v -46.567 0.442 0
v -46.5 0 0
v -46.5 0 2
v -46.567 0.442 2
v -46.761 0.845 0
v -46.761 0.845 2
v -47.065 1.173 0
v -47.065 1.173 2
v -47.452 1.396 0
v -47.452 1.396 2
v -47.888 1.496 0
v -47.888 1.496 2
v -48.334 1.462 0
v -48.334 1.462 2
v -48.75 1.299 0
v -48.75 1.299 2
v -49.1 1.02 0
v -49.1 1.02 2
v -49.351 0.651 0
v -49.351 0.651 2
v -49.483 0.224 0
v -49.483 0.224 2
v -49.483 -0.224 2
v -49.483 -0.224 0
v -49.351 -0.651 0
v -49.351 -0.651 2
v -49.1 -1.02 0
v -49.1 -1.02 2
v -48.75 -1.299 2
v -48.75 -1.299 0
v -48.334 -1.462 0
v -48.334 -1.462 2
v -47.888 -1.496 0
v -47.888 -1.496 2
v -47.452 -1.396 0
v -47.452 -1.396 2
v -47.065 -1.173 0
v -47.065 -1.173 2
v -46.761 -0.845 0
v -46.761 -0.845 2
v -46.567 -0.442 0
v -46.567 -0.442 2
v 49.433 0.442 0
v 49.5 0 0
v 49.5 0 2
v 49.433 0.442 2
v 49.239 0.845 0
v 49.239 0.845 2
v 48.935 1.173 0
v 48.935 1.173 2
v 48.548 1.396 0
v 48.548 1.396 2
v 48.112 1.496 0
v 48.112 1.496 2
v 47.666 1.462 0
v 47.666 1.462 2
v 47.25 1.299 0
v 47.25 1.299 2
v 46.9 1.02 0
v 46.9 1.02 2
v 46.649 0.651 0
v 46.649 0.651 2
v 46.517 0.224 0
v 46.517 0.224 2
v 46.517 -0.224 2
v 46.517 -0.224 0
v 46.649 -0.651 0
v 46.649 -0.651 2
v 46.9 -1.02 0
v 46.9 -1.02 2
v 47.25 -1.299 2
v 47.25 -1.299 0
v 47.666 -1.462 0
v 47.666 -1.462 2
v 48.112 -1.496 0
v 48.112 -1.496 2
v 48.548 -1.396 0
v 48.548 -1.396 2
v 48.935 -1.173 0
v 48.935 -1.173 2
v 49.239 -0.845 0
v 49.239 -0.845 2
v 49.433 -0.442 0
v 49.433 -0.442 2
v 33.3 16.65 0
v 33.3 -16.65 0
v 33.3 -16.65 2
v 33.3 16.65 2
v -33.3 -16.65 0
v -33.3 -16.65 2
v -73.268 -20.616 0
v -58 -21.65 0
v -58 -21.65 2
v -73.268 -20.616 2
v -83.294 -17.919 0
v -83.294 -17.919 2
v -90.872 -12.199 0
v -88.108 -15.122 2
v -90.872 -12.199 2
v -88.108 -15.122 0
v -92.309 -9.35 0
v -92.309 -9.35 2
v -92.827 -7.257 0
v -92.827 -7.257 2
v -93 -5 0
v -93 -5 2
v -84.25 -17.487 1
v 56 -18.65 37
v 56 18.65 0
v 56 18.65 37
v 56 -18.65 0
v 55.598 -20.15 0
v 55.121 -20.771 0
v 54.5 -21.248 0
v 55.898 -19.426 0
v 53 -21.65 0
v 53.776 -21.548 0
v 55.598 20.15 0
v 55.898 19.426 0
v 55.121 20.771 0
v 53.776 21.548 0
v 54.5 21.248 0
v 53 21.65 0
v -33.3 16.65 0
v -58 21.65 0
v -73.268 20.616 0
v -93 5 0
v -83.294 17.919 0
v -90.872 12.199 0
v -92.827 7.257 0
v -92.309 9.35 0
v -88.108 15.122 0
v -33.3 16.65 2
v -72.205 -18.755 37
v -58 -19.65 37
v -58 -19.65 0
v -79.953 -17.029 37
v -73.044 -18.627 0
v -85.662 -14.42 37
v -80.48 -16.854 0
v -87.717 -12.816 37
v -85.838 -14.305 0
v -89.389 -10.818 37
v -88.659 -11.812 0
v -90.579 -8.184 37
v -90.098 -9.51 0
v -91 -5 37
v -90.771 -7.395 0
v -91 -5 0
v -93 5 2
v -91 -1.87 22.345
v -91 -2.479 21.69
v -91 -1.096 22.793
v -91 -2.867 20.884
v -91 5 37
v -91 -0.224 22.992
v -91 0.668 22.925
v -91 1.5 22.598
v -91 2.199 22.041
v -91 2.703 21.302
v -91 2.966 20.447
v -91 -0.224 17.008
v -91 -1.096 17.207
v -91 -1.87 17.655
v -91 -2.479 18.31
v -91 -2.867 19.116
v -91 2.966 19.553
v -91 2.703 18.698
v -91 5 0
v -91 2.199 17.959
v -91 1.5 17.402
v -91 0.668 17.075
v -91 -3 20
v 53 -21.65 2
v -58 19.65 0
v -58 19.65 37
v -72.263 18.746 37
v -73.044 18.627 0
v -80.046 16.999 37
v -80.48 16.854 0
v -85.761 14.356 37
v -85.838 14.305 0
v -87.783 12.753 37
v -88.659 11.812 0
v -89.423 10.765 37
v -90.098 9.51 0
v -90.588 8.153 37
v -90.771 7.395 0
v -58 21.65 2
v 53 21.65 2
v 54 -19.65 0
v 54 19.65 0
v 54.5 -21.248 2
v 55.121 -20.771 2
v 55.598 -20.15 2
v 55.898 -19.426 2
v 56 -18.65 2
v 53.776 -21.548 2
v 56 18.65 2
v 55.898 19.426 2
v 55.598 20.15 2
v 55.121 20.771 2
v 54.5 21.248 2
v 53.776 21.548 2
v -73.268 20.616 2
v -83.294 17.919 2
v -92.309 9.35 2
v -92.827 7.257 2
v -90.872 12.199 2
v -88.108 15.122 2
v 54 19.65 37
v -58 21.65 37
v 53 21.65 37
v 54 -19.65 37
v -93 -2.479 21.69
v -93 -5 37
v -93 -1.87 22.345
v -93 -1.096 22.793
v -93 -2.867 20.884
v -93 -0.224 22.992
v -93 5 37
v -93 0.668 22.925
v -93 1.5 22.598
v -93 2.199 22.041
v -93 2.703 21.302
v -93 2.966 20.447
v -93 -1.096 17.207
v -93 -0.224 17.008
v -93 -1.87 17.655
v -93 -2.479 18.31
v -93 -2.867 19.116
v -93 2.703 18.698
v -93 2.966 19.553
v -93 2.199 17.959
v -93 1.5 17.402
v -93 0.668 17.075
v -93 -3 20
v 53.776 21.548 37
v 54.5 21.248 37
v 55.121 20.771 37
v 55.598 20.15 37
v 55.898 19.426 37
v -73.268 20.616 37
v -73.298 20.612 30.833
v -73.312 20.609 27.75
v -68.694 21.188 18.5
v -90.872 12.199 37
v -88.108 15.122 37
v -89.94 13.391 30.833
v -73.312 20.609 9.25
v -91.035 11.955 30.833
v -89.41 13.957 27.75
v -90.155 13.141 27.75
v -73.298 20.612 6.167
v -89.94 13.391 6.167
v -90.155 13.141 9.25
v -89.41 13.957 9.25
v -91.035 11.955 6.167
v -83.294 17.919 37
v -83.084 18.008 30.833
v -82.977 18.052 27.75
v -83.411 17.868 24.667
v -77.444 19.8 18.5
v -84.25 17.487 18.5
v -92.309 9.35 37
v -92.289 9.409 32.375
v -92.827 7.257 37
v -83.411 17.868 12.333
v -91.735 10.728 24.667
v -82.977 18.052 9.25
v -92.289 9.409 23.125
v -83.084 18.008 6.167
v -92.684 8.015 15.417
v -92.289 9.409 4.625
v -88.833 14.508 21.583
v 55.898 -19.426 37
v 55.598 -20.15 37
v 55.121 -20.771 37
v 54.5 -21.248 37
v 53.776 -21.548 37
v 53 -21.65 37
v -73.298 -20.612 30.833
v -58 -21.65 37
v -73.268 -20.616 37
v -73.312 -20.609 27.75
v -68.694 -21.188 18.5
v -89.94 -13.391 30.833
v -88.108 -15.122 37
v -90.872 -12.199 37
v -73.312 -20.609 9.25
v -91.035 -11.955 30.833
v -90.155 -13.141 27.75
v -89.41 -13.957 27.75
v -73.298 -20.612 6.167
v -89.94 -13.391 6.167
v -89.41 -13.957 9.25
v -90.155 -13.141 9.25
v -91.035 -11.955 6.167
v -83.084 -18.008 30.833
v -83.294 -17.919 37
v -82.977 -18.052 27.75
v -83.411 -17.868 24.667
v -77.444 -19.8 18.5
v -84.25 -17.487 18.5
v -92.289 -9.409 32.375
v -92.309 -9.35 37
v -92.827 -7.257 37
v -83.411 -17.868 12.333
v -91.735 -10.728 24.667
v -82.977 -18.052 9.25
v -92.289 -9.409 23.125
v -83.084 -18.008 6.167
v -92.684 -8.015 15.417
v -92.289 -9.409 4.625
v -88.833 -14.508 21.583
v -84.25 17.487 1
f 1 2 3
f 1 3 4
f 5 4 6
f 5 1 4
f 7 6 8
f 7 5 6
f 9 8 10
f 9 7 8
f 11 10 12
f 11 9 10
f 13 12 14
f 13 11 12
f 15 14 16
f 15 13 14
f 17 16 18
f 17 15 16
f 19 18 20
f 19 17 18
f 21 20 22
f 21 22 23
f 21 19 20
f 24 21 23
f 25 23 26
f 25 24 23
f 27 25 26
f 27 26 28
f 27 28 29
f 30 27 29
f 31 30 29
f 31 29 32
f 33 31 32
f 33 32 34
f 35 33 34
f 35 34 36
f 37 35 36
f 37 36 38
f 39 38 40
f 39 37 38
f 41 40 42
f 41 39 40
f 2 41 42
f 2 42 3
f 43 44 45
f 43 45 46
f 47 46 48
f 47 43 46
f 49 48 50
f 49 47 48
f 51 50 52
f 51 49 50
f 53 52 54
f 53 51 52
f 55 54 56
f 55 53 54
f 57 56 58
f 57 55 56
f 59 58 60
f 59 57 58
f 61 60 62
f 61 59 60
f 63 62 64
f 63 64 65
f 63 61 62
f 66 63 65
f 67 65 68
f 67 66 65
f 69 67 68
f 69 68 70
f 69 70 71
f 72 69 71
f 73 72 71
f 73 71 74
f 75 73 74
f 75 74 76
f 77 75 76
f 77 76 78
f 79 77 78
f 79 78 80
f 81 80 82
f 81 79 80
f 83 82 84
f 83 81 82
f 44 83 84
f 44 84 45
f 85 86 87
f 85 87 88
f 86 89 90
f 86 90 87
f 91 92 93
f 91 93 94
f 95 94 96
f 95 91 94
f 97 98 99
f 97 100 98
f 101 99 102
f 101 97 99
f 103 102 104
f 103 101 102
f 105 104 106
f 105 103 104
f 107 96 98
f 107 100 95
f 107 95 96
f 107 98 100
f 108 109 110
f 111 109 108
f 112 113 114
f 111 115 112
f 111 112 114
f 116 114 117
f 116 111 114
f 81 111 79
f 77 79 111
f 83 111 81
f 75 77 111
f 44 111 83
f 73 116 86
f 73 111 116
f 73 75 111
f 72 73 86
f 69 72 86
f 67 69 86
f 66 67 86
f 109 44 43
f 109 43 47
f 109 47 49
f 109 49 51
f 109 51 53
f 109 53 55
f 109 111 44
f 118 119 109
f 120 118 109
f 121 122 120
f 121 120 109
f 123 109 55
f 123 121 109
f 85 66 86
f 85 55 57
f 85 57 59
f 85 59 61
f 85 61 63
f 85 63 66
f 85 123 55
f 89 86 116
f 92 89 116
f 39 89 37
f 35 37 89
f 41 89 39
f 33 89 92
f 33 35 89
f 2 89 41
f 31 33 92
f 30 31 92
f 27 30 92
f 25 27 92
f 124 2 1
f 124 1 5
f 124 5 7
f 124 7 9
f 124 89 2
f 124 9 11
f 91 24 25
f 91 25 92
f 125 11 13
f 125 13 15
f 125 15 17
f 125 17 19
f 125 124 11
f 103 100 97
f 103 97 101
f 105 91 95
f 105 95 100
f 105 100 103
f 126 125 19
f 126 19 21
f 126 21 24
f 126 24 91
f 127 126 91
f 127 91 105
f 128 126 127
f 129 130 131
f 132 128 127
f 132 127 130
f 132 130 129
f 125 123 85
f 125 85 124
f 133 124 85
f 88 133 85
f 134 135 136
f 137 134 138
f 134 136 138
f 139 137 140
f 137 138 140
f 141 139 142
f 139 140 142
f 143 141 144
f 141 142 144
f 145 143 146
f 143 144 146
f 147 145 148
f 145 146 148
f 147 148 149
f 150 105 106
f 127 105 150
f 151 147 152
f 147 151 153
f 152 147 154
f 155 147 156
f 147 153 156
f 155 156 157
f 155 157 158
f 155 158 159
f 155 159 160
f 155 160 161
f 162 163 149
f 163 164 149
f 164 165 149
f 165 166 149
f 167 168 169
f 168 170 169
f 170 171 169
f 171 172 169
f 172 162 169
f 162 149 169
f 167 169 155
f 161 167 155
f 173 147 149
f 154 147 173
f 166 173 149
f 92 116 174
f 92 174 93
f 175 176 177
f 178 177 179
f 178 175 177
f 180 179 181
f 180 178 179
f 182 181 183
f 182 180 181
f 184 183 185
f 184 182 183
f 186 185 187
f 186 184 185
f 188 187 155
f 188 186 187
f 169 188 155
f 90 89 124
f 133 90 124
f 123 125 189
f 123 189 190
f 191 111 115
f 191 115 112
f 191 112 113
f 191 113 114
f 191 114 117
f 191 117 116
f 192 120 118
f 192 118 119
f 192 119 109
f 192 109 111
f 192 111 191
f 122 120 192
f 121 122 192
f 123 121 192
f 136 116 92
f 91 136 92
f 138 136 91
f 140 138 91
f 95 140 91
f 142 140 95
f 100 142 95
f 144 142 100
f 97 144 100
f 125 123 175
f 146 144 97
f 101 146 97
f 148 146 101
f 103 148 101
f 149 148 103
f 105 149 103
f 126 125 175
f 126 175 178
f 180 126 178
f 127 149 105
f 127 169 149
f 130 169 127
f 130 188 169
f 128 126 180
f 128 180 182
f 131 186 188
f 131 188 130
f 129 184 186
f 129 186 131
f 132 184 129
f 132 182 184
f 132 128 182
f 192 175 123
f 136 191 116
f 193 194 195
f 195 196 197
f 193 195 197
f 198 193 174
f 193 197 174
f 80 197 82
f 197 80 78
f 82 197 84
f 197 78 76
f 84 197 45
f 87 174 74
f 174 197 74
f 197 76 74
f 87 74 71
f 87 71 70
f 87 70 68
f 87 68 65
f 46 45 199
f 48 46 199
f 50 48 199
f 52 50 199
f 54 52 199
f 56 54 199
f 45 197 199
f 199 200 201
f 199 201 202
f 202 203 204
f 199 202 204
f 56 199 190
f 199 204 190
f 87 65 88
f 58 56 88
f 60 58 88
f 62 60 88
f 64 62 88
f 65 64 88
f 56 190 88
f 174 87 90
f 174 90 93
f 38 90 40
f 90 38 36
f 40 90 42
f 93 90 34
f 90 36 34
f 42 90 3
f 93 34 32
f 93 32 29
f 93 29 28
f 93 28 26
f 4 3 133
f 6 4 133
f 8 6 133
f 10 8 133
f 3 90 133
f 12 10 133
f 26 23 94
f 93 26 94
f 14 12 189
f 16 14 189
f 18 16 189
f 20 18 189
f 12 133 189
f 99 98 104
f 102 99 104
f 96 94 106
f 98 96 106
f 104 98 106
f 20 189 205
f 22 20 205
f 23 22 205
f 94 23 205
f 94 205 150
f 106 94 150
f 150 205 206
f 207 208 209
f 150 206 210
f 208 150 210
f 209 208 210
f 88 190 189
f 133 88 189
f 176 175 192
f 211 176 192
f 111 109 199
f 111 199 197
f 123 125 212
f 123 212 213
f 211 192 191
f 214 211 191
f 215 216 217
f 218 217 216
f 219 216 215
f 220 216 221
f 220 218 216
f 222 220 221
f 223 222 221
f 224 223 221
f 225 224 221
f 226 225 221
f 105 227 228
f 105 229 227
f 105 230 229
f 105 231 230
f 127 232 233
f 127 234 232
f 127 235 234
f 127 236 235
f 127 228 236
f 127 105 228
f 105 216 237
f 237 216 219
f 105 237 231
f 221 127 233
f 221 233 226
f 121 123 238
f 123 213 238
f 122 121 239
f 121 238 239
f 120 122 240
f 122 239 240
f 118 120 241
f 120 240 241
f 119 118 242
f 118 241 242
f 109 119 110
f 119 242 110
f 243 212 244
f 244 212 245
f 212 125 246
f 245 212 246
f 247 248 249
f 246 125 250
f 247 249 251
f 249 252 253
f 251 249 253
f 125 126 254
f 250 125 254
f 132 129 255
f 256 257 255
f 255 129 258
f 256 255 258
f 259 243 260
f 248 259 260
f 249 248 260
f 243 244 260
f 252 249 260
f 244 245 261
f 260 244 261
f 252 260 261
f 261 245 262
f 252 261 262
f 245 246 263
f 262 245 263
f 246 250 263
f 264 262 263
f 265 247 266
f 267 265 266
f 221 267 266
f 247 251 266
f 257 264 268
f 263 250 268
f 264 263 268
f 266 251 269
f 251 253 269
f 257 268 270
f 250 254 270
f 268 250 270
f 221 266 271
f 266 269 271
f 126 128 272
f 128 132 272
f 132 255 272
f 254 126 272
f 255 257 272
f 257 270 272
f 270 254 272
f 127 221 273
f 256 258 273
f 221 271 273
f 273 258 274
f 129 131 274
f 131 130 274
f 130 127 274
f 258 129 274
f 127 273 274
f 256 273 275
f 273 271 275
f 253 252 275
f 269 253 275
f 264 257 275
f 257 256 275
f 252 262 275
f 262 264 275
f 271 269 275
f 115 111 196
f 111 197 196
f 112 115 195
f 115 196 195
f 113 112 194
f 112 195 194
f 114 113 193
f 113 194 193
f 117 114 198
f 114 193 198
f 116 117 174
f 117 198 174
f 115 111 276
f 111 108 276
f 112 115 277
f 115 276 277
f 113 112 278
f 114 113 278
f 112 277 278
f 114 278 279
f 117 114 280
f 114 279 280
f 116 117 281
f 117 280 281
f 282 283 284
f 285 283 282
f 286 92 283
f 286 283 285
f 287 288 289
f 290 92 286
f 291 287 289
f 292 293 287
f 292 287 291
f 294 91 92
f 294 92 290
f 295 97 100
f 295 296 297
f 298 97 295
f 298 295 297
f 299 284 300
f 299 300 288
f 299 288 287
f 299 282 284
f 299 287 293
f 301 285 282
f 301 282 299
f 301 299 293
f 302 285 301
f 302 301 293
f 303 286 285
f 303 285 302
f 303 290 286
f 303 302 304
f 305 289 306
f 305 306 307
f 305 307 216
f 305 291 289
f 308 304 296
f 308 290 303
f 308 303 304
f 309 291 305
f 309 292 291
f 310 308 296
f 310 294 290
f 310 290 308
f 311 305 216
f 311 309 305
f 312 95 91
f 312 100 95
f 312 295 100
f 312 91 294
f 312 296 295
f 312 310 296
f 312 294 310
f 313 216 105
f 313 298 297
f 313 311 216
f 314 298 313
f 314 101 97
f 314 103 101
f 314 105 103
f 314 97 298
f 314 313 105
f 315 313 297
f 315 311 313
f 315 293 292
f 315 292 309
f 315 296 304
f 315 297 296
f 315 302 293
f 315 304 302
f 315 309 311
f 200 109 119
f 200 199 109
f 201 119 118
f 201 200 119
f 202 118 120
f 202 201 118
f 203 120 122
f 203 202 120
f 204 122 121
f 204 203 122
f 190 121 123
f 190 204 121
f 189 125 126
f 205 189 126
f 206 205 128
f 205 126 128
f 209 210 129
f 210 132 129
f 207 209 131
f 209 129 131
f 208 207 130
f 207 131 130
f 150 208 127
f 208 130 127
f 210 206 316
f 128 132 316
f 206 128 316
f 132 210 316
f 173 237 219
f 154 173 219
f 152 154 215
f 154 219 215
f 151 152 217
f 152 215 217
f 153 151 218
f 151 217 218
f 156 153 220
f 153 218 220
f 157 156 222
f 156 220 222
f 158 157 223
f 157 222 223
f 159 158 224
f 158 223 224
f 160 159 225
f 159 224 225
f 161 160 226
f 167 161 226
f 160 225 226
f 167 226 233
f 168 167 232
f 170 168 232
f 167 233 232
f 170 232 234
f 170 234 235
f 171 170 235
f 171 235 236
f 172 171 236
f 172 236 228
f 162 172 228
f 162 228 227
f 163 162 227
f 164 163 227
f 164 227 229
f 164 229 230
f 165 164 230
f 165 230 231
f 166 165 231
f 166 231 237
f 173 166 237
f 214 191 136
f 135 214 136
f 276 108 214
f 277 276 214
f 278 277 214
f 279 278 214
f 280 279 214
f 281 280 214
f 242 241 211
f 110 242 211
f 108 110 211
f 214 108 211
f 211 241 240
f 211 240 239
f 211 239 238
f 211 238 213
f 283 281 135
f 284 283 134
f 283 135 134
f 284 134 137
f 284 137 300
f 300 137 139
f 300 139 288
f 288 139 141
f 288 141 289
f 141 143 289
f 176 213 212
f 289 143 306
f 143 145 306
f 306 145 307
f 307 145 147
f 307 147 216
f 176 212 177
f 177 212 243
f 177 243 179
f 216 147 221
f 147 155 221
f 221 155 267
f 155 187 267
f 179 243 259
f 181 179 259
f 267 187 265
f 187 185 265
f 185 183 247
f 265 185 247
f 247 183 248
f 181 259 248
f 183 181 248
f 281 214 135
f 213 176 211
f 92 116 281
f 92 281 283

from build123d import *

# Parameters (mm, degrees)
PAD_DEPTH    = 37
THICKNESS_T  = -2
SKETCH002_R  = 3
HOLE_DEPTH   = 25
HOLE_TIPS_R  = 3
FILLET_R     = 3
SKETCH_W     = 66.6
SKETCH_H     = 33.3
SKETCH_R     = 1.5
PAD001_DEPTH = 2
FILLET001_R  = 3
FILLET002_R  = 3


with BuildPart() as body:
    # Sketch001 → Pad (new body)
    with BuildSketch(Plane.XY):
        with BuildLine():
            Line((-58, 21.65), (56, 21.65))
            Line((56, 21.65), (56, -21.65))
            Line((56, -21.65), (-58, -21.65))
            add(Edge.make_bspline(
                [(-58, -21.65), (-93, -21.65), (-93, -5)],
                knots=[0, 0, 0, 1, 1, 1], degree=2))
            Line((-93, -5), (-93, 5))
            add(Edge.make_bspline(
                [(-58, 21.65), (-93, 21.65), (-93, 5)],
                knots=[0, 0, 0, 1, 1, 1], degree=2))
        make_face()
    extrude(amount=PAD_DEPTH)

    # Thickness
    thickness_openings = [body.faces().sort_by_distance(p)[0] for p in [
        (-16.404598, 0, 37),
        (-16.404598, 0, 0),
    ]]
    offset(amount=THICKNESS_T, openings=thickness_openings)

    # Sketch002 (on Face5 of Thickness) → Hole (cut)
    with BuildSketch(Plane(origin=(-93, 0, 0), x_dir=(0, -1, 0), z_dir=(-1, 0, 0))):
        with Locations((0, 20)):
            Circle(SKETCH002_R)
    extrude(amount=-HOLE_DEPTH, mode=Mode.SUBTRACT)

    # Hole tips → Hole tip 1 section 0
    with BuildSketch(Plane(origin=(-68, 0, 0), x_dir=(0, -1, 0), z_dir=(-1, 0, 0)), mode=Mode.PRIVATE) as hole_tip_1_s0:
        with Locations((0, 20)):
            Circle(HOLE_TIPS_R)
    loft([hole_tip_1_s0.sketch, Vertex(-66.197418, 0, 20)], mode=Mode.SUBTRACT)

    # Fillet
    fillet_edges = [body.edges().sort_by_distance(p)[0] for p in [
        (56, 21.65, 18.5),
        (56, -21.65, 18.5),
    ]]
    fillet(fillet_edges, radius=FILLET_R)


with BuildPart() as body001:
    # Sketch → Pad001 (new body)
    with BuildSketch(Plane.XY):
        with BuildLine():
            Line((-58, 21.65), (56, 21.65))
            Line((56, 21.65), (56, -21.65))
            Line((56, -21.65), (-58, -21.65))
            add(Edge.make_bspline(
                [(-58, -21.65), (-93, -21.65), (-93, -5)],
                knots=[0, 0, 0, 1, 1, 1], degree=2))
            Line((-93, -5), (-93, 5))
            add(Edge.make_bspline(
                [(-58, 21.65), (-93, 21.65), (-93, 5)],
                knots=[0, 0, 0, 1, 1, 1], degree=2))
        make_face()
        Rectangle(SKETCH_W, SKETCH_H, mode=Mode.SUBTRACT)
        with Locations((-48, 0)):
            Circle(SKETCH_R, mode=Mode.SUBTRACT)
        with Locations((48, 0)):
            Circle(SKETCH_R, mode=Mode.SUBTRACT)
    extrude(amount=PAD001_DEPTH)

    # Fillet001
    fillet001_edges = [body001.edges().sort_by_distance(p)[0] for p in [
        (56, -21.65, 1),
    ]]
    fillet(fillet001_edges, radius=FILLET001_R)

    # Fillet002
    fillet002_edges = [body001.edges().sort_by_distance(p)[0] for p in [
        (56, 21.65, 1),
    ]]
    fillet(fillet002_edges, radius=FILLET002_R)


solid = Compound([body.part, body001.part])
